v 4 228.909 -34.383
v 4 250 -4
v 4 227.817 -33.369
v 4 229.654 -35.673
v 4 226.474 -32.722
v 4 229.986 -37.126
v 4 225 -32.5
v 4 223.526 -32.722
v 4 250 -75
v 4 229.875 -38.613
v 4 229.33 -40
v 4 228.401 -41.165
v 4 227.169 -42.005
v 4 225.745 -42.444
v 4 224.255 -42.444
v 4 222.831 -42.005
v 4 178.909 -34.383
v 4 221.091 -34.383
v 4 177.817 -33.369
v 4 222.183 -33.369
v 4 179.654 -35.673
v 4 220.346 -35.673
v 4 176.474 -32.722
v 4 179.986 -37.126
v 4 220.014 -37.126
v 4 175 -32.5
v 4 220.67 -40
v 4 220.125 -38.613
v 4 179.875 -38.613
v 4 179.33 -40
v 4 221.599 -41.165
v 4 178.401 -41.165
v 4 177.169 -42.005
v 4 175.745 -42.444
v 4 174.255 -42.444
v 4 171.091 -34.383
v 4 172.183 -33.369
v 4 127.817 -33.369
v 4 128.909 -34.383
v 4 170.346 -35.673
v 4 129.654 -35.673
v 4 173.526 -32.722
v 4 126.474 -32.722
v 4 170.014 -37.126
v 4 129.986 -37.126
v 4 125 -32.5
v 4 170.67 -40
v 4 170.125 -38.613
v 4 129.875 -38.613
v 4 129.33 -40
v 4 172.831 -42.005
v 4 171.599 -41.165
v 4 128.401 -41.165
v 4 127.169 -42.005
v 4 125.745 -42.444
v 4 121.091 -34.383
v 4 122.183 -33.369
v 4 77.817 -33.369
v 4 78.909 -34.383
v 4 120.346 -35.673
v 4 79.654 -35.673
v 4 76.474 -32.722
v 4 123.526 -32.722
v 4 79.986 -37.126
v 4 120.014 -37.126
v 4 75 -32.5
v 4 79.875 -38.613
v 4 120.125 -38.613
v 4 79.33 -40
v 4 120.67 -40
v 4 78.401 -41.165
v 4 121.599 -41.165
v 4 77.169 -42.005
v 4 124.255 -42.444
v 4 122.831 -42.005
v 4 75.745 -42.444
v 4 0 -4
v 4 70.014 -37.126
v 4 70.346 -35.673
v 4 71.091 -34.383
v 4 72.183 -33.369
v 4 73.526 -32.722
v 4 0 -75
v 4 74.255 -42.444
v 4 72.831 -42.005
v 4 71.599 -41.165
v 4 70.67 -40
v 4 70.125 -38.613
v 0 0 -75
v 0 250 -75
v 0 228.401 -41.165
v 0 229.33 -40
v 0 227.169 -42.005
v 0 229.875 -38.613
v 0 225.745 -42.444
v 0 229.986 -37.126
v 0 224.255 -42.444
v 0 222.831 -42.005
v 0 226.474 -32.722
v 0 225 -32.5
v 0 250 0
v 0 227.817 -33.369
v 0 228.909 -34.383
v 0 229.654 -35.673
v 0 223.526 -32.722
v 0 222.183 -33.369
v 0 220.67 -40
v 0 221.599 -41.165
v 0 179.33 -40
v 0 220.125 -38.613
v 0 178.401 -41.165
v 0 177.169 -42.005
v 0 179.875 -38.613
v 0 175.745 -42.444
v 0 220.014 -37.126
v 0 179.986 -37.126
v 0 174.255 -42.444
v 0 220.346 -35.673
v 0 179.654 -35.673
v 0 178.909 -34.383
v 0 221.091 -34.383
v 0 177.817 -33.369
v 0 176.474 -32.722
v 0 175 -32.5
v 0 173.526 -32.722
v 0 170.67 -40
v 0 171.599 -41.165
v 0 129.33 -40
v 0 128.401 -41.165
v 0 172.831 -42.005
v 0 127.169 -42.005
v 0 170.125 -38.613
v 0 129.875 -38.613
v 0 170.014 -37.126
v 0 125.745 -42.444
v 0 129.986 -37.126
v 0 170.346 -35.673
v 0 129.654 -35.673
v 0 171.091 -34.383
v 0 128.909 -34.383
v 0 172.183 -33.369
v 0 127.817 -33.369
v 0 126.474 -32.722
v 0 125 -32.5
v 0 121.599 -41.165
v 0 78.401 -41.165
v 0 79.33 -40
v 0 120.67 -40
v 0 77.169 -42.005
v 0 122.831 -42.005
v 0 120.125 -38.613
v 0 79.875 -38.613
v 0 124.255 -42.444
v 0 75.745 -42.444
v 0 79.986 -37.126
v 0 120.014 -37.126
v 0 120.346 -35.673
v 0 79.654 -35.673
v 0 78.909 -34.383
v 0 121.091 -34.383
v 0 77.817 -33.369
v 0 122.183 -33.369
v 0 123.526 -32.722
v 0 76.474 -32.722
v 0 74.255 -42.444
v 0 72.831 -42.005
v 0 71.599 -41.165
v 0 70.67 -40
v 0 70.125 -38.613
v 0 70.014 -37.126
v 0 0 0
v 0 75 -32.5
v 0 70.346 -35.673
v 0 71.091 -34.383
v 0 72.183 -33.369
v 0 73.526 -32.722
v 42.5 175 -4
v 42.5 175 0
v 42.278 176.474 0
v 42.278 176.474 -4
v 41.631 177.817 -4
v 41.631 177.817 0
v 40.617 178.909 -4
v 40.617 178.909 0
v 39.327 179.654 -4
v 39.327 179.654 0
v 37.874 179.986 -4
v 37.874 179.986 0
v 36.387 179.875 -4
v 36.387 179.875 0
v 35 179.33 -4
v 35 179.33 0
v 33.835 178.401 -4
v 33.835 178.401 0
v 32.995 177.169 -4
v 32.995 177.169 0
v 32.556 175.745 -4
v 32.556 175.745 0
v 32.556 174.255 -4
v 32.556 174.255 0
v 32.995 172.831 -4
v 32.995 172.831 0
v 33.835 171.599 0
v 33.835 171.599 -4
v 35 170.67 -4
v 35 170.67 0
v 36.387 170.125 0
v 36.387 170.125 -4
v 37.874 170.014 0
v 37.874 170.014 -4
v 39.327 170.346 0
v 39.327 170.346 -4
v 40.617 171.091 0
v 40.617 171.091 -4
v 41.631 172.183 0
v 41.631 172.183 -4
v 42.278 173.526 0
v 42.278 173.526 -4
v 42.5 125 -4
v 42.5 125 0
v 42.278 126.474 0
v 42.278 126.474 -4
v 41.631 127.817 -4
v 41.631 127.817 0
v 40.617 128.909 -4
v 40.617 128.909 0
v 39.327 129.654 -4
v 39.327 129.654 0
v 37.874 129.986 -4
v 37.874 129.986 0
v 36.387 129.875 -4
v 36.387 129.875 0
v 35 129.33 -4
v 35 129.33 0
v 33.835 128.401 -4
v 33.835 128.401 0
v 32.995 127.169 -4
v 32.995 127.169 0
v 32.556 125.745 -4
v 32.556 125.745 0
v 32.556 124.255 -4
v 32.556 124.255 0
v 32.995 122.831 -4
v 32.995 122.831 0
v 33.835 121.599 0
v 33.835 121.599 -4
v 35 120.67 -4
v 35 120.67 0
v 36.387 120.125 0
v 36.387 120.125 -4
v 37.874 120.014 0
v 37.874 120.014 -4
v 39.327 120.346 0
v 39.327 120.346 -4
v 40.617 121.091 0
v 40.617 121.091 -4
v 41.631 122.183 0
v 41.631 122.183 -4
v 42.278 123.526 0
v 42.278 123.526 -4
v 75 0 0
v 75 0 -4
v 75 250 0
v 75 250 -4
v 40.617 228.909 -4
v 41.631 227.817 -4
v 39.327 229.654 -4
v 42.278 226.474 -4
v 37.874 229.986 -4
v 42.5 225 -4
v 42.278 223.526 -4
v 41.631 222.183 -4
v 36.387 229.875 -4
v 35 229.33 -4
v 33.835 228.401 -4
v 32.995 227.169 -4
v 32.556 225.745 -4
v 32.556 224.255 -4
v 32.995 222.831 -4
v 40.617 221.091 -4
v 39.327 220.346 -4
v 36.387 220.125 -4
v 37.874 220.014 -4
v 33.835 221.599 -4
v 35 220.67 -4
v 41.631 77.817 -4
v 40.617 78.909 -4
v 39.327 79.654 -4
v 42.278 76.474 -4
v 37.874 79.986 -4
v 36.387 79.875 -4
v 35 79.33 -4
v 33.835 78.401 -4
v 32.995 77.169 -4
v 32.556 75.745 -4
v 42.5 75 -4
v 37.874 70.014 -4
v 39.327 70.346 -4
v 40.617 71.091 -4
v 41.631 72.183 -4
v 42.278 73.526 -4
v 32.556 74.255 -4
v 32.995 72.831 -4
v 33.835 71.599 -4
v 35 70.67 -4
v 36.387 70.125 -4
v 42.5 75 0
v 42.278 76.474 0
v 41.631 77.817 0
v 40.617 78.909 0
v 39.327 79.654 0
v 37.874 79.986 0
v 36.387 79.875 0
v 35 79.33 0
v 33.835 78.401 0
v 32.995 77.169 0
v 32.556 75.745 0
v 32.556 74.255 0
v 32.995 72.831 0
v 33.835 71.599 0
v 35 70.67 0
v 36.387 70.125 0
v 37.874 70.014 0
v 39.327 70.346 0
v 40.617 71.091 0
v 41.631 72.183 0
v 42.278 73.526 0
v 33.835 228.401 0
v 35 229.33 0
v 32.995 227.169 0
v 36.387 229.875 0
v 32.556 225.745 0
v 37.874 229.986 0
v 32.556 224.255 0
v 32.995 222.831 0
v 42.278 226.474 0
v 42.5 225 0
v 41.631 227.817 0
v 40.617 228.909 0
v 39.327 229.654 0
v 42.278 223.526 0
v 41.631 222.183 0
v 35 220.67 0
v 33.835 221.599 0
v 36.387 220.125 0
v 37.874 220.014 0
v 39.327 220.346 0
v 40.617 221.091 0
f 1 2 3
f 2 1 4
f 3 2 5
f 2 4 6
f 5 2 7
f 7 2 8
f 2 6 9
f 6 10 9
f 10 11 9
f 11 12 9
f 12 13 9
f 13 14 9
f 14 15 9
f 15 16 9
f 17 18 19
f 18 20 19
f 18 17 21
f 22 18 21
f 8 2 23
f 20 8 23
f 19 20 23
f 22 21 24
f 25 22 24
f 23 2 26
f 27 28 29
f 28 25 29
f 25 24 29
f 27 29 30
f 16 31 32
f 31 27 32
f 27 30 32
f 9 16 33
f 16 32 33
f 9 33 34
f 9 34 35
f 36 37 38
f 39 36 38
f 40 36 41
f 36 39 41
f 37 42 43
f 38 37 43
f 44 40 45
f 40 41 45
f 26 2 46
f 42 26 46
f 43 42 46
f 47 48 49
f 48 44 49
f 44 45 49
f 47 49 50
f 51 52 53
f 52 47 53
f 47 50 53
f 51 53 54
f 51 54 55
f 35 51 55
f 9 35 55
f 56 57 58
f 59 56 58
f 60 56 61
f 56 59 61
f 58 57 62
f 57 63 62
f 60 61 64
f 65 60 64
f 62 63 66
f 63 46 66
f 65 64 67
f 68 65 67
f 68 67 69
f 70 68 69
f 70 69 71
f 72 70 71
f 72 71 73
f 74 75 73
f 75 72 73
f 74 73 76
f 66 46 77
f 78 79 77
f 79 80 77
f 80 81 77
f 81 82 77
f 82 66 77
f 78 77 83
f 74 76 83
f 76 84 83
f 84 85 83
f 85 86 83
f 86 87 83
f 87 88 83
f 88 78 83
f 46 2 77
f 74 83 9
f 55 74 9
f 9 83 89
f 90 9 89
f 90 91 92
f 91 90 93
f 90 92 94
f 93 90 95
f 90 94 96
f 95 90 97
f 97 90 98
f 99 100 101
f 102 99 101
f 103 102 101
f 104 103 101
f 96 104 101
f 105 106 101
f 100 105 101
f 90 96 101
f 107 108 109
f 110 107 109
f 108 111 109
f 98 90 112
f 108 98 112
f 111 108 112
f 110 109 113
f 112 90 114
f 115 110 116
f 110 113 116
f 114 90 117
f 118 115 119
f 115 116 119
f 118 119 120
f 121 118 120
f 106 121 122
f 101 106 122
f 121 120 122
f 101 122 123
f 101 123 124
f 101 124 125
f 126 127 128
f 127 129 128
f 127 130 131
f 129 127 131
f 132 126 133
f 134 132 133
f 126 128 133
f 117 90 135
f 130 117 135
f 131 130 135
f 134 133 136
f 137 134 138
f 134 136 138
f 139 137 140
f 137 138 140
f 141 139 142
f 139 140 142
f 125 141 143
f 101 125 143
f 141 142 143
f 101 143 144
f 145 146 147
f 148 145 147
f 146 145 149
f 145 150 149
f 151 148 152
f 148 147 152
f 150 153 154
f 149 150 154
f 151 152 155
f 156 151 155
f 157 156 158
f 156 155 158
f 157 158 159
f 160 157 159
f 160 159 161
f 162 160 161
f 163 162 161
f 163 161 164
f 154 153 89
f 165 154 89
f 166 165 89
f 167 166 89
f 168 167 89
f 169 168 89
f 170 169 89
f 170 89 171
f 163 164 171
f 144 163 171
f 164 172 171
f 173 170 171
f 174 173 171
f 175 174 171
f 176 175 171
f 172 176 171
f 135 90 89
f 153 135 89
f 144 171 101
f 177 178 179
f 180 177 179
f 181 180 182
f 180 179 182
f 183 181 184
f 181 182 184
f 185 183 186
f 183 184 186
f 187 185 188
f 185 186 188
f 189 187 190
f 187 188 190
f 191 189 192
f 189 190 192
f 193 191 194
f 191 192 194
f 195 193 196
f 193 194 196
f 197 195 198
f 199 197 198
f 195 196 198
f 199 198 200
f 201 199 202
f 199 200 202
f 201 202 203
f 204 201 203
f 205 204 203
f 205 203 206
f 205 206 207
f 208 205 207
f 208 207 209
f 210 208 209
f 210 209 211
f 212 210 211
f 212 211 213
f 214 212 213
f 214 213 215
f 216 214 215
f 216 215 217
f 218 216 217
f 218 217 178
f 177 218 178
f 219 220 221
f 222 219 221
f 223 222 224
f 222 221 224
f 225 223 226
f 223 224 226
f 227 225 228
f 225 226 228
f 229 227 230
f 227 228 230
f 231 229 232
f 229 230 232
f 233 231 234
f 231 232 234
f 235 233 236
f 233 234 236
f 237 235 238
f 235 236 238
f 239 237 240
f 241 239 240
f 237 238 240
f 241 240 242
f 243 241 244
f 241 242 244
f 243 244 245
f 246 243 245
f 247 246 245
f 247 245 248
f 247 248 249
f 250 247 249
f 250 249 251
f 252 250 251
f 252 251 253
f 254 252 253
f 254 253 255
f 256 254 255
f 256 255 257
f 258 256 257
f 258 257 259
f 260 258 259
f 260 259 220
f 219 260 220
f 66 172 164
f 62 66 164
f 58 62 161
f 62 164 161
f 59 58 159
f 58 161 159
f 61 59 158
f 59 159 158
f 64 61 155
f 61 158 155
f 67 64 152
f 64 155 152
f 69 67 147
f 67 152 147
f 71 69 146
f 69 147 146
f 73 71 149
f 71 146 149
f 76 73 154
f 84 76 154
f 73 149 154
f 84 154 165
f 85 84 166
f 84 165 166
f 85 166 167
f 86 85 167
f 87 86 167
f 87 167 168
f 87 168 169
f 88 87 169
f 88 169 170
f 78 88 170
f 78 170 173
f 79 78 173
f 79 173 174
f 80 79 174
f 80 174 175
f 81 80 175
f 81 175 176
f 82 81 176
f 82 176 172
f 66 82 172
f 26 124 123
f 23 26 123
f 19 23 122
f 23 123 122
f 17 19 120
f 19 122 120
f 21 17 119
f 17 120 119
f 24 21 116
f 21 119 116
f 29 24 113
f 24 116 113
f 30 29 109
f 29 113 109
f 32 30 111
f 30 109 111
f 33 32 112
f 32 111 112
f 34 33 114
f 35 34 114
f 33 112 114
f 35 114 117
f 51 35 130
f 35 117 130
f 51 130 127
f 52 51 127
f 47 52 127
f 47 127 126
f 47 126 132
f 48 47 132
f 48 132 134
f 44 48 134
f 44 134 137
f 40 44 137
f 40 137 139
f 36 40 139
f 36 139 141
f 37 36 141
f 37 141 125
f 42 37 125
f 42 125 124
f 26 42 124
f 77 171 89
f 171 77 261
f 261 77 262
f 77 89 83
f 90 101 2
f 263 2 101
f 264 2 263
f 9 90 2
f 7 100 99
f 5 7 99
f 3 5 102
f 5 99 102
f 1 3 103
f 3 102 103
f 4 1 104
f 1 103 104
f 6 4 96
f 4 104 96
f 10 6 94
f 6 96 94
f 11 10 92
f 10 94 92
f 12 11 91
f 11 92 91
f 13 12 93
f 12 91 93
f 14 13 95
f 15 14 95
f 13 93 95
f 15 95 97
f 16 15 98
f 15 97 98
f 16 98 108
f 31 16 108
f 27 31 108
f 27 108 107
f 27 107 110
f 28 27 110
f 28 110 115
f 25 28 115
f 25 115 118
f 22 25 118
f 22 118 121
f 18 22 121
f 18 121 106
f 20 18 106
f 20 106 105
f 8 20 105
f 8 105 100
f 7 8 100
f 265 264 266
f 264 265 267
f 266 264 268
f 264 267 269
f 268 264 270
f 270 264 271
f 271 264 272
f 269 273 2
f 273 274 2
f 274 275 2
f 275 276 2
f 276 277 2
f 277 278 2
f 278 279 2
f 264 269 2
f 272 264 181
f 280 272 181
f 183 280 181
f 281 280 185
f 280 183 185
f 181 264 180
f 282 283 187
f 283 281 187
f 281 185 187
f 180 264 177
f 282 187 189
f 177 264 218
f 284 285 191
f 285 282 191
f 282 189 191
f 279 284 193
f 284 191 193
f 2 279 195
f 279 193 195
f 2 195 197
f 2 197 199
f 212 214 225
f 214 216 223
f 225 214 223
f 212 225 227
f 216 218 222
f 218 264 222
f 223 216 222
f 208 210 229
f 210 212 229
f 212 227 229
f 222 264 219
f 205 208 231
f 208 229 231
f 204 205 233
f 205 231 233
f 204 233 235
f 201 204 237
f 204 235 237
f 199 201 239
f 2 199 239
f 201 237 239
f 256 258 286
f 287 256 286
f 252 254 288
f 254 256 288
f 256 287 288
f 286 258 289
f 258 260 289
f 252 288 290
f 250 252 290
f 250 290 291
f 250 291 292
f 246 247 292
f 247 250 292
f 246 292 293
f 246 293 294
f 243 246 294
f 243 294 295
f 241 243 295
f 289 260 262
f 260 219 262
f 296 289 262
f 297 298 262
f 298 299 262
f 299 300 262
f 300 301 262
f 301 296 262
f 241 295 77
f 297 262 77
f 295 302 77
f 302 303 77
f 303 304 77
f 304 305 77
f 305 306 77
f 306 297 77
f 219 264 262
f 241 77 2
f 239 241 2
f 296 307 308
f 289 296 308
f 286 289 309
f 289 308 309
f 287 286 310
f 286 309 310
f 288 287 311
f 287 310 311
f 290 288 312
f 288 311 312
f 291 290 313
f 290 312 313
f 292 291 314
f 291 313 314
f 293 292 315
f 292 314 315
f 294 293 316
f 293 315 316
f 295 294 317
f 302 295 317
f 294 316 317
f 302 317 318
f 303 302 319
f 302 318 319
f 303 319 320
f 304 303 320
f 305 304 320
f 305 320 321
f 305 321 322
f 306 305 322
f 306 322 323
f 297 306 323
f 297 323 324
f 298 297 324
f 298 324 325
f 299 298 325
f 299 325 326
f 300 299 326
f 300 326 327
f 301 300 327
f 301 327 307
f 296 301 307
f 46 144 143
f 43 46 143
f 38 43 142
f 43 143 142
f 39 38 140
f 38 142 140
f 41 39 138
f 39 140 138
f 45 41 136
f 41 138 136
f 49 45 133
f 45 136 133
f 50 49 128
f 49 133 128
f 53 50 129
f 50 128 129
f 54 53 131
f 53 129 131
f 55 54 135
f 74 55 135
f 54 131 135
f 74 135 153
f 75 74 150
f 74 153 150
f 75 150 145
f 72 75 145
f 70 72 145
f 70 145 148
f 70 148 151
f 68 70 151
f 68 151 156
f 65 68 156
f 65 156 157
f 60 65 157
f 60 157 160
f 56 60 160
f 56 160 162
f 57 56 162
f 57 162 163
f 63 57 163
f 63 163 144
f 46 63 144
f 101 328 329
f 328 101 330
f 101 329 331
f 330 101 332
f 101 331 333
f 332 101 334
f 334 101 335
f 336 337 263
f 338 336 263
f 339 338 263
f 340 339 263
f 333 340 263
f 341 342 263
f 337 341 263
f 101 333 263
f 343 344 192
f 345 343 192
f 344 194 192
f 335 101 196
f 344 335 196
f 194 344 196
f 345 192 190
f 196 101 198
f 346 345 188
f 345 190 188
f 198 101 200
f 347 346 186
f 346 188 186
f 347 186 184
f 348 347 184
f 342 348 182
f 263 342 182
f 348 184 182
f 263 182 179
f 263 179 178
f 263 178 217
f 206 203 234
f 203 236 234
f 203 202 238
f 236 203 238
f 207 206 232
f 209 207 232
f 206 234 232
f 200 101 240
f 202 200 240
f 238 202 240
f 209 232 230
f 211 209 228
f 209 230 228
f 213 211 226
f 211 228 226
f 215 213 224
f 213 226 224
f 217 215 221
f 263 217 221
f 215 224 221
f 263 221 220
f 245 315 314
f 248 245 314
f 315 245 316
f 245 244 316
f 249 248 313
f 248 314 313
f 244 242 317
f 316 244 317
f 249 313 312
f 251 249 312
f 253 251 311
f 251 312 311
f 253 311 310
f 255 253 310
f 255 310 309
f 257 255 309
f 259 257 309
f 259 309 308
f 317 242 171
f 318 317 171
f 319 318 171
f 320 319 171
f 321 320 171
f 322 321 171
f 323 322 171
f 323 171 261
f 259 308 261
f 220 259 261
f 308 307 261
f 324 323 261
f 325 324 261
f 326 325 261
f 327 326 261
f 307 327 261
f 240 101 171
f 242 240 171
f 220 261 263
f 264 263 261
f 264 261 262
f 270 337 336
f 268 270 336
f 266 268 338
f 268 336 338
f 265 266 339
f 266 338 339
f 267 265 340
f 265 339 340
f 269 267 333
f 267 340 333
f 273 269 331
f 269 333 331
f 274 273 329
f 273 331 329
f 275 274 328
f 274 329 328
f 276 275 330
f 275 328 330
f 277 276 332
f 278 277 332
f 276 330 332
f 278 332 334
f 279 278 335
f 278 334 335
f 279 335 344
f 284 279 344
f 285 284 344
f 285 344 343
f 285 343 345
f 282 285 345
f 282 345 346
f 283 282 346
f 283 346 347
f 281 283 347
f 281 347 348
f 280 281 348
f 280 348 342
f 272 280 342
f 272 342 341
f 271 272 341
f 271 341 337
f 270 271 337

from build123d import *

# Parameters (mm, degrees)
EXTRUDE_1_DEPTH     = 250
SKETCH_2_R          = 5
CUT_EXTRUDE_1_DEPTH = 10
SKETCH_3_R          = 5
CUT_EXTRUDE_2_DEPTH = 10


with BuildPart() as part:
    # Эскиз1 → Вытянуть-Тонкостенный1 (new body)
    with BuildSketch(Plane(origin=(0, 0, 0), x_dir=(1, 0, 0), z_dir=(0, 1, 0))):
        Polygon((0, 75), (0, 0), (75, 0), (75, 4), (4, 4), (4, 75), align=None)
    extrude(amount=EXTRUDE_1_DEPTH)

    # Эскиз2 → Вырез-Вытянуть1 (cut)
    with BuildSketch(Plane.XY):
        with Locations((37.5, 225)):
            Circle(SKETCH_2_R)
        with Locations((37.5, 175)):
            Circle(SKETCH_2_R)
        with Locations((37.5, 125)):
            Circle(SKETCH_2_R)
        with Locations((37.5, 75)):
            Circle(SKETCH_2_R)
    extrude(amount=-CUT_EXTRUDE_1_DEPTH, mode=Mode.SUBTRACT)

    # Эскиз3 → Вырез-Вытянуть2 (cut)
    with BuildSketch(Plane.ZY):
        with Locations((-37.5, 225)):
            Circle(SKETCH_3_R)
        with Locations((-37.5, 175)):
            Circle(SKETCH_3_R)
        with Locations((-37.5, 125)):
            Circle(SKETCH_3_R)
        with Locations((-37.5, 75)):
            Circle(SKETCH_3_R)
    extrude(amount=-CUT_EXTRUDE_2_DEPTH, mode=Mode.SUBTRACT)


solid = part.part
